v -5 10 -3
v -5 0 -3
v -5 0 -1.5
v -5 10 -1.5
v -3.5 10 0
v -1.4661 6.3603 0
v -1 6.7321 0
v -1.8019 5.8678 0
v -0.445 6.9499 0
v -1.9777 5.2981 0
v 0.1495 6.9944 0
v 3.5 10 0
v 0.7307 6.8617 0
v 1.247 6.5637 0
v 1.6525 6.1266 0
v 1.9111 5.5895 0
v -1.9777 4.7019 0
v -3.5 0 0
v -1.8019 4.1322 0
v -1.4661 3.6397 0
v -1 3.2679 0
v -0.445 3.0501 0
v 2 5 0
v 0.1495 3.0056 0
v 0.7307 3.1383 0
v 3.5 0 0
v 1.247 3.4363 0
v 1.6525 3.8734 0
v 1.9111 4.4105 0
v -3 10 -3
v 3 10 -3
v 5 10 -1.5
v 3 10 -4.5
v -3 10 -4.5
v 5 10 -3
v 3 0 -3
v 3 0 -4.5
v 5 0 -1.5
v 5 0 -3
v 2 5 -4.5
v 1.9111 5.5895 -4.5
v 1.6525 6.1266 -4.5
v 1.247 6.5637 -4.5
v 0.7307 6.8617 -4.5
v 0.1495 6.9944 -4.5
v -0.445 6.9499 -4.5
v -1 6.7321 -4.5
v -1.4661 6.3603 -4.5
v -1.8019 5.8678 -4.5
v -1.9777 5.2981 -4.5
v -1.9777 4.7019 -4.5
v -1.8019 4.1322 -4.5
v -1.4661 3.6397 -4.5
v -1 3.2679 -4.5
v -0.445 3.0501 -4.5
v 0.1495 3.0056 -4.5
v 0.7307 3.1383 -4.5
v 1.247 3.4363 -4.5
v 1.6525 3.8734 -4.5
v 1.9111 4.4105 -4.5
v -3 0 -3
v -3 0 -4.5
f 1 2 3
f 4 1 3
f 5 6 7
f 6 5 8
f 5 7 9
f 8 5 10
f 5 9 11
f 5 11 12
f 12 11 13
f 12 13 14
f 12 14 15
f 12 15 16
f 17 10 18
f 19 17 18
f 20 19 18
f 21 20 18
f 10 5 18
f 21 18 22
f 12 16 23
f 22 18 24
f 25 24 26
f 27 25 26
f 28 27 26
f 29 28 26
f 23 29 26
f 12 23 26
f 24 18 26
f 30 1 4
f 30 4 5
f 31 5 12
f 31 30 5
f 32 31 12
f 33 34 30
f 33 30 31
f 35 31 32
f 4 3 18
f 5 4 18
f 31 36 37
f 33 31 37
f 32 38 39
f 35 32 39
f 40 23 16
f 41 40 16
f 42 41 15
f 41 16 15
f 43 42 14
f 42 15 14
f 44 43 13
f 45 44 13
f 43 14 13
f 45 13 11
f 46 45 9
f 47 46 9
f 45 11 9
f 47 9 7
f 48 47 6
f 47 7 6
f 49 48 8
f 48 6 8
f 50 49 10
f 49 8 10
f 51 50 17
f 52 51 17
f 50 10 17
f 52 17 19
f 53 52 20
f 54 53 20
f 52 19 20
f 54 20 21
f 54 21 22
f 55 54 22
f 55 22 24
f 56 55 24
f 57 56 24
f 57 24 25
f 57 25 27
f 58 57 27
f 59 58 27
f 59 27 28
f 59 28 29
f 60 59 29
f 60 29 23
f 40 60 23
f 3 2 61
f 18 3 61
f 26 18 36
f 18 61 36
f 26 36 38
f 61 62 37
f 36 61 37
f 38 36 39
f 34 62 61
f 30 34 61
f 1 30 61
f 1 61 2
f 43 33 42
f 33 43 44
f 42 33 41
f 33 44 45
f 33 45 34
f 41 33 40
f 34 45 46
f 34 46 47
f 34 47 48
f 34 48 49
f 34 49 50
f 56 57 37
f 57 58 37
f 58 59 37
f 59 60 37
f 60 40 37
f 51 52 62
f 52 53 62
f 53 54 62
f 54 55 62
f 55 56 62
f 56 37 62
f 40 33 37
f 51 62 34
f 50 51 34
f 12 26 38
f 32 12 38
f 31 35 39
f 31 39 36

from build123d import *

# Parameters (mm, degrees)
EXTRUDE_1_DEPTH     = 10
SKETCH_2_R          = 2
CUT_EXTRUDE_1_DEPTH = 13.051970793


with BuildPart() as part:
    # 草图1 → 凸台-拉伸1 (new body)
    with BuildSketch(Plane(origin=(0, 0, 0), x_dir=(1, 0, 0), z_dir=(0, 1, 0))):
        Polygon((-3.5, 0), (3.5, 0), (5, 1.5), (5, 3), (3, 3), (3, 4.5), (-3, 4.5), (-3, 3), (-5, 3), (-5, 1.5), align=None)
    extrude(amount=EXTRUDE_1_DEPTH)

    # 草图2 → 切除-拉伸1 (cut, through all)
    with BuildSketch(Plane.XY):
        with Locations((0, 5)):
            Circle(SKETCH_2_R)
    extrude(amount=-CUT_EXTRUDE_1_DEPTH, mode=Mode.SUBTRACT)


solid = part.part
